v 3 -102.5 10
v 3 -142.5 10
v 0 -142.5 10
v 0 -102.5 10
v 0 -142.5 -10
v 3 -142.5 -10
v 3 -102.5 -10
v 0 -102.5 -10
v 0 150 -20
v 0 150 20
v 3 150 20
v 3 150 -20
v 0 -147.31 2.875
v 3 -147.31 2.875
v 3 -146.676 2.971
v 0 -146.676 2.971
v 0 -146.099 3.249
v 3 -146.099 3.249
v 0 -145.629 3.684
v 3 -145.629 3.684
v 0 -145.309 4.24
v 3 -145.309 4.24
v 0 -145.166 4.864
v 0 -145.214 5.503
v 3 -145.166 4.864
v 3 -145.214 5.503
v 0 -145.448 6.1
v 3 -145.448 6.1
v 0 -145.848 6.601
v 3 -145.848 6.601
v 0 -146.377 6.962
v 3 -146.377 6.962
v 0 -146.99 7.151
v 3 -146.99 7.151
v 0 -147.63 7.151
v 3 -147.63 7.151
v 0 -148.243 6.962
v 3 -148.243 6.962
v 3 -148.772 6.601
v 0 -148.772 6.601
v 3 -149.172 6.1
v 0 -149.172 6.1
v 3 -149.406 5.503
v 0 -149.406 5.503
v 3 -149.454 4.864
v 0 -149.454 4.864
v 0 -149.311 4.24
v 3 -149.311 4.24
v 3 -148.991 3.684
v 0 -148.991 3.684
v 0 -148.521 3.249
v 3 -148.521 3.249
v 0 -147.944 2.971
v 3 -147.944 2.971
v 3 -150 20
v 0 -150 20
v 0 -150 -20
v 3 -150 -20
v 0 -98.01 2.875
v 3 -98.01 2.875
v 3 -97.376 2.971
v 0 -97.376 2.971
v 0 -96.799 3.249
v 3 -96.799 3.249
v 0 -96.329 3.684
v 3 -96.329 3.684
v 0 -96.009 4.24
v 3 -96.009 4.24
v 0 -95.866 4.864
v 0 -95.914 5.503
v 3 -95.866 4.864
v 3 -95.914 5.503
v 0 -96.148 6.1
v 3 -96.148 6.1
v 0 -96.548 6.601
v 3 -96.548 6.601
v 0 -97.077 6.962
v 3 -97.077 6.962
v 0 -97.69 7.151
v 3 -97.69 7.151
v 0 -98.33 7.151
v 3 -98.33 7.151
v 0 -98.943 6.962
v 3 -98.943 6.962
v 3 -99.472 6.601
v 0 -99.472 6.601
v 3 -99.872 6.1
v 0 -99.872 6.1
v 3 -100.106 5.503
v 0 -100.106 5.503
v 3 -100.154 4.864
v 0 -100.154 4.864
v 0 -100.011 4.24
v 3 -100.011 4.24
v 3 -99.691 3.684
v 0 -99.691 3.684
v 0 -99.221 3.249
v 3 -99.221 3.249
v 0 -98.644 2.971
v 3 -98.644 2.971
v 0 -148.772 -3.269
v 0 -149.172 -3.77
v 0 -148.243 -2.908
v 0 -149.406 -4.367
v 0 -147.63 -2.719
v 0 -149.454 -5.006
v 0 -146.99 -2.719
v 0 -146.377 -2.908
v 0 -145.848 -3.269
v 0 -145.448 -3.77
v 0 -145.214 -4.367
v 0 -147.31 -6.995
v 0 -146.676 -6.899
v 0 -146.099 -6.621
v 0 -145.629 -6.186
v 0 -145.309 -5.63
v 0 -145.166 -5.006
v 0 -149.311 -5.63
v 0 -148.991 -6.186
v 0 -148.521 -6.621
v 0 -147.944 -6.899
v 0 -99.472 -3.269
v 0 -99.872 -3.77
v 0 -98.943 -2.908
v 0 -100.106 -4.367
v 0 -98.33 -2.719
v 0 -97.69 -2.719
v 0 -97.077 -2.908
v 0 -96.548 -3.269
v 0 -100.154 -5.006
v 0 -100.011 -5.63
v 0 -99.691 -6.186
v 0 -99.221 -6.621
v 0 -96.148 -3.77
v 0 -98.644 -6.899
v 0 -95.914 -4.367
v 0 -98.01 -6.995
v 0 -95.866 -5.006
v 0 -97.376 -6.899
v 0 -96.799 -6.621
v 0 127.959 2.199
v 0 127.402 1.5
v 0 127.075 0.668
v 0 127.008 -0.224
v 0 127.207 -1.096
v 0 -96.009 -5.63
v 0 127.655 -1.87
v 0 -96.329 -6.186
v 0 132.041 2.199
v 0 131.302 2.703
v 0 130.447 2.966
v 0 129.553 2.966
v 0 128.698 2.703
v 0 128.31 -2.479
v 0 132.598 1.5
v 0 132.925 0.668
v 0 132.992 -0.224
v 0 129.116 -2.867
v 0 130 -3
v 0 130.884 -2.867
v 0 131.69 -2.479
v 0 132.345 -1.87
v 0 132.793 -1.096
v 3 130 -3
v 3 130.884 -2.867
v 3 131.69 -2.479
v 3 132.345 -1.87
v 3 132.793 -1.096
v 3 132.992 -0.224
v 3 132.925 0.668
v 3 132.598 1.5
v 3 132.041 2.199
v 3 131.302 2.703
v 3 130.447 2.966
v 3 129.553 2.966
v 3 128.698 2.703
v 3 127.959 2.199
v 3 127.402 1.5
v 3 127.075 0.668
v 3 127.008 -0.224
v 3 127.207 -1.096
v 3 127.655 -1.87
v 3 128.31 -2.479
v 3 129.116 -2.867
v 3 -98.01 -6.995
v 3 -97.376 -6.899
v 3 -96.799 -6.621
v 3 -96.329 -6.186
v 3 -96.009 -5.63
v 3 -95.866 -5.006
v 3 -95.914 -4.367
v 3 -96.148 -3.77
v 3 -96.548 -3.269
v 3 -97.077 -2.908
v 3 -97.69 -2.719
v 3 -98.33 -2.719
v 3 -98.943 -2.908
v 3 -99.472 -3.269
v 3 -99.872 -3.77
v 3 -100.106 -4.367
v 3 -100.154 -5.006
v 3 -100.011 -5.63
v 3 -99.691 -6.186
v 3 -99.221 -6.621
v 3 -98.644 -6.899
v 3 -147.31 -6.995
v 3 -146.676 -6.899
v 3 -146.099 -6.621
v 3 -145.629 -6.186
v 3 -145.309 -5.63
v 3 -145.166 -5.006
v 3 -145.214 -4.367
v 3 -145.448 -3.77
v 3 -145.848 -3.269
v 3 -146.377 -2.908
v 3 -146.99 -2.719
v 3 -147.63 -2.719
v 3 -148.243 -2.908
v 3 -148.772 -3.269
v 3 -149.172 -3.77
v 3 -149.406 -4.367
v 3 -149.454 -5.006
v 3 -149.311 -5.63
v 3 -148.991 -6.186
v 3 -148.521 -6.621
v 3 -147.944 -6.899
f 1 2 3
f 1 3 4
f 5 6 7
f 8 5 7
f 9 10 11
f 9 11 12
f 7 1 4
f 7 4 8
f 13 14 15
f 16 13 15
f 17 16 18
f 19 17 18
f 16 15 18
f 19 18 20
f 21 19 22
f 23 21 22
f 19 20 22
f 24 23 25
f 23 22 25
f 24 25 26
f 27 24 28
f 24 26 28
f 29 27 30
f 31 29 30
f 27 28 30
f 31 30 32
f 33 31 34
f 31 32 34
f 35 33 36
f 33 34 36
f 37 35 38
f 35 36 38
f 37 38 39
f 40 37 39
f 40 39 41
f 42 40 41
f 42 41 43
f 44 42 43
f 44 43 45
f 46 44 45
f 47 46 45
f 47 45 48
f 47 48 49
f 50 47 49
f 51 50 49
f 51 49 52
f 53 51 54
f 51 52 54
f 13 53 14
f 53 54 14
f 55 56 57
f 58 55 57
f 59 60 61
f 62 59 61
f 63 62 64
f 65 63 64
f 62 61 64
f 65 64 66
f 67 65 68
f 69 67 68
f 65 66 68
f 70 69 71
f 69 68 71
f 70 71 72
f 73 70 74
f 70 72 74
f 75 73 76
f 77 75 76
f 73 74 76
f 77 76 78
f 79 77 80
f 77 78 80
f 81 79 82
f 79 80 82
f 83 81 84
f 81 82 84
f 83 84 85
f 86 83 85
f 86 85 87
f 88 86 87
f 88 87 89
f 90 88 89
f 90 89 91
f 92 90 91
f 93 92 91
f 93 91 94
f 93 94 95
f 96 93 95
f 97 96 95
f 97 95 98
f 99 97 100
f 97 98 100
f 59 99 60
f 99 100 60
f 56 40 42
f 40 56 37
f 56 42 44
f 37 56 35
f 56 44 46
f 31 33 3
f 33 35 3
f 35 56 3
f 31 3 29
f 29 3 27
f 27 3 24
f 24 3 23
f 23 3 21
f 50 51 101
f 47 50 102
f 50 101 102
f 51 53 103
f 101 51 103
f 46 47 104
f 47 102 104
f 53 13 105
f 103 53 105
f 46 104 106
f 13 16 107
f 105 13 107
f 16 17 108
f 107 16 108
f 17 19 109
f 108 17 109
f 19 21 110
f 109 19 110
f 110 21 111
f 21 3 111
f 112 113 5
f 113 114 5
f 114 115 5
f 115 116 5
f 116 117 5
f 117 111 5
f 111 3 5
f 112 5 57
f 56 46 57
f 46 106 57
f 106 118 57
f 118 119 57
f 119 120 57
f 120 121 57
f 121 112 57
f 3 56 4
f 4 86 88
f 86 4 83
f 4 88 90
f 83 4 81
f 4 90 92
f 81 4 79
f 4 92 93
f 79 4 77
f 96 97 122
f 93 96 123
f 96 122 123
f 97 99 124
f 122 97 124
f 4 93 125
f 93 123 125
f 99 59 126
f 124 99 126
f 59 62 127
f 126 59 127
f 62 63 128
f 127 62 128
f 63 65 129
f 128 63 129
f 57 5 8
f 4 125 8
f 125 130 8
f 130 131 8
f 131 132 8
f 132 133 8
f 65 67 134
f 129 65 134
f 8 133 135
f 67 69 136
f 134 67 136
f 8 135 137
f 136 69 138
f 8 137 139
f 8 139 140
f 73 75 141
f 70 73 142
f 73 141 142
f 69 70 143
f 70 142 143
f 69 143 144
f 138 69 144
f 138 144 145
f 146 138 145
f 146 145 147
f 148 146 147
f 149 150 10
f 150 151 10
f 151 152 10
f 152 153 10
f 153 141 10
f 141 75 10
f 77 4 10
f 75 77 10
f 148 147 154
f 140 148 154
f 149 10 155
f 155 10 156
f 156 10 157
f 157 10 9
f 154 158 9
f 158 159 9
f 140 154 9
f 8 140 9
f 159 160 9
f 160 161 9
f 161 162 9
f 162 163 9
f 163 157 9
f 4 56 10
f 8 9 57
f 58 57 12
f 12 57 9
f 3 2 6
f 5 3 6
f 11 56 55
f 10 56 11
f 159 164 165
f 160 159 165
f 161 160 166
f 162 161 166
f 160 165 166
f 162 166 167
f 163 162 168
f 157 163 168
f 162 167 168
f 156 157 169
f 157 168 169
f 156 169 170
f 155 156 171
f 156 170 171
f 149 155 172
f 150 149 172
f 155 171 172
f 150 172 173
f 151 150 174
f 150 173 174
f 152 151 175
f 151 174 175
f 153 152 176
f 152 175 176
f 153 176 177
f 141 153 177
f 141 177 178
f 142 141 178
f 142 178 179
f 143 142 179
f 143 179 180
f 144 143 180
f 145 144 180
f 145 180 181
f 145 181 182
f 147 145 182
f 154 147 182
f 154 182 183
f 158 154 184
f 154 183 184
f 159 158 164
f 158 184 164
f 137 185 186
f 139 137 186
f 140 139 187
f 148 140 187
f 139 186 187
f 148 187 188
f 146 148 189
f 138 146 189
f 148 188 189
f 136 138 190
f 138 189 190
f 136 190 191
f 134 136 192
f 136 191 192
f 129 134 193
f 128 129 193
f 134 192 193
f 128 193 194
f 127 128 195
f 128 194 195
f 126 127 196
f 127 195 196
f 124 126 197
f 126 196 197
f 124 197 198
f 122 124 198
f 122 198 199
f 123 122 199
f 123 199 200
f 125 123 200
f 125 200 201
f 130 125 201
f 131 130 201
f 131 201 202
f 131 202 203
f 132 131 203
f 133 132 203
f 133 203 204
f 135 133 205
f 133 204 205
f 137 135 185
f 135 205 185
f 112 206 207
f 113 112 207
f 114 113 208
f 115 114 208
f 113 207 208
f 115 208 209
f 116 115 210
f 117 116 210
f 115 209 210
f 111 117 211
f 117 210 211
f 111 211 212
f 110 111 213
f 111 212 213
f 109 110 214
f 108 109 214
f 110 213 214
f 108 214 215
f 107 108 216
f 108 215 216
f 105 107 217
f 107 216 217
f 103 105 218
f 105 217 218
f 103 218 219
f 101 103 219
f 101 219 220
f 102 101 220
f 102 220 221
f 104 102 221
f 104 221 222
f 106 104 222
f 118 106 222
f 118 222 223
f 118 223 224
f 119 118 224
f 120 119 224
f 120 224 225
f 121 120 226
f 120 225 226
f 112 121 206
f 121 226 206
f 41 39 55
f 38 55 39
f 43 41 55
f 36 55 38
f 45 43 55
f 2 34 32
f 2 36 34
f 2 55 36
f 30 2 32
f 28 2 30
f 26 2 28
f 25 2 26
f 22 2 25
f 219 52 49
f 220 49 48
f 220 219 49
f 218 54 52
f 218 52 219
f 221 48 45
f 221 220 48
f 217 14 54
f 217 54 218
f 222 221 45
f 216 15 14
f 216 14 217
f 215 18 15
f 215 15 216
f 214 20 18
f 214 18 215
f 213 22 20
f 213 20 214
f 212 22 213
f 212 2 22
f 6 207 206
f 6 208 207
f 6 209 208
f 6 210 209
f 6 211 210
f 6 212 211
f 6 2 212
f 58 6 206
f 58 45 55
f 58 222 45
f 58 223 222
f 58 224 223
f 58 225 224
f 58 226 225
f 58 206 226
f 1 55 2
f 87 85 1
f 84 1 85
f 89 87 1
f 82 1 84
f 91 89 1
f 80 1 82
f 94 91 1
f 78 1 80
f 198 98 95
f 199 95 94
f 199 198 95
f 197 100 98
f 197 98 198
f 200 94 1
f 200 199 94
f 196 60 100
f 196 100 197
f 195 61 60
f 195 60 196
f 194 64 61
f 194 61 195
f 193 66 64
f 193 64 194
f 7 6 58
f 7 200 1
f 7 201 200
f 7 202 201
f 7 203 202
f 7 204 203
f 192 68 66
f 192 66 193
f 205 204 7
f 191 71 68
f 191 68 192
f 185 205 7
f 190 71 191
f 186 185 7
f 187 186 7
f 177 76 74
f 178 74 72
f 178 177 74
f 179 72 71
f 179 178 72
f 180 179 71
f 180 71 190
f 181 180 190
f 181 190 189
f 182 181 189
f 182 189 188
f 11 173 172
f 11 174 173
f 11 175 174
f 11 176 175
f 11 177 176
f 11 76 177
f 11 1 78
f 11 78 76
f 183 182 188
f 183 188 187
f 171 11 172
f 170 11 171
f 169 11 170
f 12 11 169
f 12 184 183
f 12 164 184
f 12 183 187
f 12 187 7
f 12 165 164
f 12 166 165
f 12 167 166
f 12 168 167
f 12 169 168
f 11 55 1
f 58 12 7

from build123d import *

# Parameters (mm, degrees)
SKETCH1_W           = 40
SKETCH1_H           = 300
BOSS_EXTRUDE1_DEPTH = 3
SKETCH2_R           = 3
CUT_EXTRUDE1_DEPTH  = 3
SKETCH3_R           = 2.15
SKETCH3_W           = 20
SKETCH3_H           = 40
CUT_EXTRUDE2_DEPTH  = 3


with BuildPart() as part:
    # Sketch1 → Boss-Extrude1 (new body)
    with BuildSketch(Plane(origin=(0, 0, 0), x_dir=(0, 0, -1), z_dir=(1, 0, 0))):
        Rectangle(SKETCH1_W, SKETCH1_H)
    extrude(amount=BOSS_EXTRUDE1_DEPTH)

    # Sketch2 → Cut-Extrude1 (cut)
    with BuildSketch(Plane(origin=(3, 0, 0), x_dir=(0, 0, -1), z_dir=(1, 0, 0))):
        with Locations((0, 130)):
            Circle(SKETCH2_R)
    extrude(amount=-CUT_EXTRUDE1_DEPTH, mode=Mode.SUBTRACT)

    # Sketch3 → Cut-Extrude2 (cut)
    with BuildSketch(Plane(origin=(3, 0, 0), x_dir=(0, 0, -1), z_dir=(1, 0, 0))):
        with Locations((-5.025, -147.31)):
            Circle(SKETCH3_R)
        with Locations((4.845, -147.31)):
            Circle(SKETCH3_R)
        with Locations((-5.025, -98.01)):
            Circle(SKETCH3_R)
        with Locations((4.845, -98.01)):
            Circle(SKETCH3_R)
        with Locations((0, -122.5)):
            Rectangle(SKETCH3_W, SKETCH3_H)
    extrude(amount=-CUT_EXTRUDE2_DEPTH, mode=Mode.SUBTRACT)


solid = part.part
